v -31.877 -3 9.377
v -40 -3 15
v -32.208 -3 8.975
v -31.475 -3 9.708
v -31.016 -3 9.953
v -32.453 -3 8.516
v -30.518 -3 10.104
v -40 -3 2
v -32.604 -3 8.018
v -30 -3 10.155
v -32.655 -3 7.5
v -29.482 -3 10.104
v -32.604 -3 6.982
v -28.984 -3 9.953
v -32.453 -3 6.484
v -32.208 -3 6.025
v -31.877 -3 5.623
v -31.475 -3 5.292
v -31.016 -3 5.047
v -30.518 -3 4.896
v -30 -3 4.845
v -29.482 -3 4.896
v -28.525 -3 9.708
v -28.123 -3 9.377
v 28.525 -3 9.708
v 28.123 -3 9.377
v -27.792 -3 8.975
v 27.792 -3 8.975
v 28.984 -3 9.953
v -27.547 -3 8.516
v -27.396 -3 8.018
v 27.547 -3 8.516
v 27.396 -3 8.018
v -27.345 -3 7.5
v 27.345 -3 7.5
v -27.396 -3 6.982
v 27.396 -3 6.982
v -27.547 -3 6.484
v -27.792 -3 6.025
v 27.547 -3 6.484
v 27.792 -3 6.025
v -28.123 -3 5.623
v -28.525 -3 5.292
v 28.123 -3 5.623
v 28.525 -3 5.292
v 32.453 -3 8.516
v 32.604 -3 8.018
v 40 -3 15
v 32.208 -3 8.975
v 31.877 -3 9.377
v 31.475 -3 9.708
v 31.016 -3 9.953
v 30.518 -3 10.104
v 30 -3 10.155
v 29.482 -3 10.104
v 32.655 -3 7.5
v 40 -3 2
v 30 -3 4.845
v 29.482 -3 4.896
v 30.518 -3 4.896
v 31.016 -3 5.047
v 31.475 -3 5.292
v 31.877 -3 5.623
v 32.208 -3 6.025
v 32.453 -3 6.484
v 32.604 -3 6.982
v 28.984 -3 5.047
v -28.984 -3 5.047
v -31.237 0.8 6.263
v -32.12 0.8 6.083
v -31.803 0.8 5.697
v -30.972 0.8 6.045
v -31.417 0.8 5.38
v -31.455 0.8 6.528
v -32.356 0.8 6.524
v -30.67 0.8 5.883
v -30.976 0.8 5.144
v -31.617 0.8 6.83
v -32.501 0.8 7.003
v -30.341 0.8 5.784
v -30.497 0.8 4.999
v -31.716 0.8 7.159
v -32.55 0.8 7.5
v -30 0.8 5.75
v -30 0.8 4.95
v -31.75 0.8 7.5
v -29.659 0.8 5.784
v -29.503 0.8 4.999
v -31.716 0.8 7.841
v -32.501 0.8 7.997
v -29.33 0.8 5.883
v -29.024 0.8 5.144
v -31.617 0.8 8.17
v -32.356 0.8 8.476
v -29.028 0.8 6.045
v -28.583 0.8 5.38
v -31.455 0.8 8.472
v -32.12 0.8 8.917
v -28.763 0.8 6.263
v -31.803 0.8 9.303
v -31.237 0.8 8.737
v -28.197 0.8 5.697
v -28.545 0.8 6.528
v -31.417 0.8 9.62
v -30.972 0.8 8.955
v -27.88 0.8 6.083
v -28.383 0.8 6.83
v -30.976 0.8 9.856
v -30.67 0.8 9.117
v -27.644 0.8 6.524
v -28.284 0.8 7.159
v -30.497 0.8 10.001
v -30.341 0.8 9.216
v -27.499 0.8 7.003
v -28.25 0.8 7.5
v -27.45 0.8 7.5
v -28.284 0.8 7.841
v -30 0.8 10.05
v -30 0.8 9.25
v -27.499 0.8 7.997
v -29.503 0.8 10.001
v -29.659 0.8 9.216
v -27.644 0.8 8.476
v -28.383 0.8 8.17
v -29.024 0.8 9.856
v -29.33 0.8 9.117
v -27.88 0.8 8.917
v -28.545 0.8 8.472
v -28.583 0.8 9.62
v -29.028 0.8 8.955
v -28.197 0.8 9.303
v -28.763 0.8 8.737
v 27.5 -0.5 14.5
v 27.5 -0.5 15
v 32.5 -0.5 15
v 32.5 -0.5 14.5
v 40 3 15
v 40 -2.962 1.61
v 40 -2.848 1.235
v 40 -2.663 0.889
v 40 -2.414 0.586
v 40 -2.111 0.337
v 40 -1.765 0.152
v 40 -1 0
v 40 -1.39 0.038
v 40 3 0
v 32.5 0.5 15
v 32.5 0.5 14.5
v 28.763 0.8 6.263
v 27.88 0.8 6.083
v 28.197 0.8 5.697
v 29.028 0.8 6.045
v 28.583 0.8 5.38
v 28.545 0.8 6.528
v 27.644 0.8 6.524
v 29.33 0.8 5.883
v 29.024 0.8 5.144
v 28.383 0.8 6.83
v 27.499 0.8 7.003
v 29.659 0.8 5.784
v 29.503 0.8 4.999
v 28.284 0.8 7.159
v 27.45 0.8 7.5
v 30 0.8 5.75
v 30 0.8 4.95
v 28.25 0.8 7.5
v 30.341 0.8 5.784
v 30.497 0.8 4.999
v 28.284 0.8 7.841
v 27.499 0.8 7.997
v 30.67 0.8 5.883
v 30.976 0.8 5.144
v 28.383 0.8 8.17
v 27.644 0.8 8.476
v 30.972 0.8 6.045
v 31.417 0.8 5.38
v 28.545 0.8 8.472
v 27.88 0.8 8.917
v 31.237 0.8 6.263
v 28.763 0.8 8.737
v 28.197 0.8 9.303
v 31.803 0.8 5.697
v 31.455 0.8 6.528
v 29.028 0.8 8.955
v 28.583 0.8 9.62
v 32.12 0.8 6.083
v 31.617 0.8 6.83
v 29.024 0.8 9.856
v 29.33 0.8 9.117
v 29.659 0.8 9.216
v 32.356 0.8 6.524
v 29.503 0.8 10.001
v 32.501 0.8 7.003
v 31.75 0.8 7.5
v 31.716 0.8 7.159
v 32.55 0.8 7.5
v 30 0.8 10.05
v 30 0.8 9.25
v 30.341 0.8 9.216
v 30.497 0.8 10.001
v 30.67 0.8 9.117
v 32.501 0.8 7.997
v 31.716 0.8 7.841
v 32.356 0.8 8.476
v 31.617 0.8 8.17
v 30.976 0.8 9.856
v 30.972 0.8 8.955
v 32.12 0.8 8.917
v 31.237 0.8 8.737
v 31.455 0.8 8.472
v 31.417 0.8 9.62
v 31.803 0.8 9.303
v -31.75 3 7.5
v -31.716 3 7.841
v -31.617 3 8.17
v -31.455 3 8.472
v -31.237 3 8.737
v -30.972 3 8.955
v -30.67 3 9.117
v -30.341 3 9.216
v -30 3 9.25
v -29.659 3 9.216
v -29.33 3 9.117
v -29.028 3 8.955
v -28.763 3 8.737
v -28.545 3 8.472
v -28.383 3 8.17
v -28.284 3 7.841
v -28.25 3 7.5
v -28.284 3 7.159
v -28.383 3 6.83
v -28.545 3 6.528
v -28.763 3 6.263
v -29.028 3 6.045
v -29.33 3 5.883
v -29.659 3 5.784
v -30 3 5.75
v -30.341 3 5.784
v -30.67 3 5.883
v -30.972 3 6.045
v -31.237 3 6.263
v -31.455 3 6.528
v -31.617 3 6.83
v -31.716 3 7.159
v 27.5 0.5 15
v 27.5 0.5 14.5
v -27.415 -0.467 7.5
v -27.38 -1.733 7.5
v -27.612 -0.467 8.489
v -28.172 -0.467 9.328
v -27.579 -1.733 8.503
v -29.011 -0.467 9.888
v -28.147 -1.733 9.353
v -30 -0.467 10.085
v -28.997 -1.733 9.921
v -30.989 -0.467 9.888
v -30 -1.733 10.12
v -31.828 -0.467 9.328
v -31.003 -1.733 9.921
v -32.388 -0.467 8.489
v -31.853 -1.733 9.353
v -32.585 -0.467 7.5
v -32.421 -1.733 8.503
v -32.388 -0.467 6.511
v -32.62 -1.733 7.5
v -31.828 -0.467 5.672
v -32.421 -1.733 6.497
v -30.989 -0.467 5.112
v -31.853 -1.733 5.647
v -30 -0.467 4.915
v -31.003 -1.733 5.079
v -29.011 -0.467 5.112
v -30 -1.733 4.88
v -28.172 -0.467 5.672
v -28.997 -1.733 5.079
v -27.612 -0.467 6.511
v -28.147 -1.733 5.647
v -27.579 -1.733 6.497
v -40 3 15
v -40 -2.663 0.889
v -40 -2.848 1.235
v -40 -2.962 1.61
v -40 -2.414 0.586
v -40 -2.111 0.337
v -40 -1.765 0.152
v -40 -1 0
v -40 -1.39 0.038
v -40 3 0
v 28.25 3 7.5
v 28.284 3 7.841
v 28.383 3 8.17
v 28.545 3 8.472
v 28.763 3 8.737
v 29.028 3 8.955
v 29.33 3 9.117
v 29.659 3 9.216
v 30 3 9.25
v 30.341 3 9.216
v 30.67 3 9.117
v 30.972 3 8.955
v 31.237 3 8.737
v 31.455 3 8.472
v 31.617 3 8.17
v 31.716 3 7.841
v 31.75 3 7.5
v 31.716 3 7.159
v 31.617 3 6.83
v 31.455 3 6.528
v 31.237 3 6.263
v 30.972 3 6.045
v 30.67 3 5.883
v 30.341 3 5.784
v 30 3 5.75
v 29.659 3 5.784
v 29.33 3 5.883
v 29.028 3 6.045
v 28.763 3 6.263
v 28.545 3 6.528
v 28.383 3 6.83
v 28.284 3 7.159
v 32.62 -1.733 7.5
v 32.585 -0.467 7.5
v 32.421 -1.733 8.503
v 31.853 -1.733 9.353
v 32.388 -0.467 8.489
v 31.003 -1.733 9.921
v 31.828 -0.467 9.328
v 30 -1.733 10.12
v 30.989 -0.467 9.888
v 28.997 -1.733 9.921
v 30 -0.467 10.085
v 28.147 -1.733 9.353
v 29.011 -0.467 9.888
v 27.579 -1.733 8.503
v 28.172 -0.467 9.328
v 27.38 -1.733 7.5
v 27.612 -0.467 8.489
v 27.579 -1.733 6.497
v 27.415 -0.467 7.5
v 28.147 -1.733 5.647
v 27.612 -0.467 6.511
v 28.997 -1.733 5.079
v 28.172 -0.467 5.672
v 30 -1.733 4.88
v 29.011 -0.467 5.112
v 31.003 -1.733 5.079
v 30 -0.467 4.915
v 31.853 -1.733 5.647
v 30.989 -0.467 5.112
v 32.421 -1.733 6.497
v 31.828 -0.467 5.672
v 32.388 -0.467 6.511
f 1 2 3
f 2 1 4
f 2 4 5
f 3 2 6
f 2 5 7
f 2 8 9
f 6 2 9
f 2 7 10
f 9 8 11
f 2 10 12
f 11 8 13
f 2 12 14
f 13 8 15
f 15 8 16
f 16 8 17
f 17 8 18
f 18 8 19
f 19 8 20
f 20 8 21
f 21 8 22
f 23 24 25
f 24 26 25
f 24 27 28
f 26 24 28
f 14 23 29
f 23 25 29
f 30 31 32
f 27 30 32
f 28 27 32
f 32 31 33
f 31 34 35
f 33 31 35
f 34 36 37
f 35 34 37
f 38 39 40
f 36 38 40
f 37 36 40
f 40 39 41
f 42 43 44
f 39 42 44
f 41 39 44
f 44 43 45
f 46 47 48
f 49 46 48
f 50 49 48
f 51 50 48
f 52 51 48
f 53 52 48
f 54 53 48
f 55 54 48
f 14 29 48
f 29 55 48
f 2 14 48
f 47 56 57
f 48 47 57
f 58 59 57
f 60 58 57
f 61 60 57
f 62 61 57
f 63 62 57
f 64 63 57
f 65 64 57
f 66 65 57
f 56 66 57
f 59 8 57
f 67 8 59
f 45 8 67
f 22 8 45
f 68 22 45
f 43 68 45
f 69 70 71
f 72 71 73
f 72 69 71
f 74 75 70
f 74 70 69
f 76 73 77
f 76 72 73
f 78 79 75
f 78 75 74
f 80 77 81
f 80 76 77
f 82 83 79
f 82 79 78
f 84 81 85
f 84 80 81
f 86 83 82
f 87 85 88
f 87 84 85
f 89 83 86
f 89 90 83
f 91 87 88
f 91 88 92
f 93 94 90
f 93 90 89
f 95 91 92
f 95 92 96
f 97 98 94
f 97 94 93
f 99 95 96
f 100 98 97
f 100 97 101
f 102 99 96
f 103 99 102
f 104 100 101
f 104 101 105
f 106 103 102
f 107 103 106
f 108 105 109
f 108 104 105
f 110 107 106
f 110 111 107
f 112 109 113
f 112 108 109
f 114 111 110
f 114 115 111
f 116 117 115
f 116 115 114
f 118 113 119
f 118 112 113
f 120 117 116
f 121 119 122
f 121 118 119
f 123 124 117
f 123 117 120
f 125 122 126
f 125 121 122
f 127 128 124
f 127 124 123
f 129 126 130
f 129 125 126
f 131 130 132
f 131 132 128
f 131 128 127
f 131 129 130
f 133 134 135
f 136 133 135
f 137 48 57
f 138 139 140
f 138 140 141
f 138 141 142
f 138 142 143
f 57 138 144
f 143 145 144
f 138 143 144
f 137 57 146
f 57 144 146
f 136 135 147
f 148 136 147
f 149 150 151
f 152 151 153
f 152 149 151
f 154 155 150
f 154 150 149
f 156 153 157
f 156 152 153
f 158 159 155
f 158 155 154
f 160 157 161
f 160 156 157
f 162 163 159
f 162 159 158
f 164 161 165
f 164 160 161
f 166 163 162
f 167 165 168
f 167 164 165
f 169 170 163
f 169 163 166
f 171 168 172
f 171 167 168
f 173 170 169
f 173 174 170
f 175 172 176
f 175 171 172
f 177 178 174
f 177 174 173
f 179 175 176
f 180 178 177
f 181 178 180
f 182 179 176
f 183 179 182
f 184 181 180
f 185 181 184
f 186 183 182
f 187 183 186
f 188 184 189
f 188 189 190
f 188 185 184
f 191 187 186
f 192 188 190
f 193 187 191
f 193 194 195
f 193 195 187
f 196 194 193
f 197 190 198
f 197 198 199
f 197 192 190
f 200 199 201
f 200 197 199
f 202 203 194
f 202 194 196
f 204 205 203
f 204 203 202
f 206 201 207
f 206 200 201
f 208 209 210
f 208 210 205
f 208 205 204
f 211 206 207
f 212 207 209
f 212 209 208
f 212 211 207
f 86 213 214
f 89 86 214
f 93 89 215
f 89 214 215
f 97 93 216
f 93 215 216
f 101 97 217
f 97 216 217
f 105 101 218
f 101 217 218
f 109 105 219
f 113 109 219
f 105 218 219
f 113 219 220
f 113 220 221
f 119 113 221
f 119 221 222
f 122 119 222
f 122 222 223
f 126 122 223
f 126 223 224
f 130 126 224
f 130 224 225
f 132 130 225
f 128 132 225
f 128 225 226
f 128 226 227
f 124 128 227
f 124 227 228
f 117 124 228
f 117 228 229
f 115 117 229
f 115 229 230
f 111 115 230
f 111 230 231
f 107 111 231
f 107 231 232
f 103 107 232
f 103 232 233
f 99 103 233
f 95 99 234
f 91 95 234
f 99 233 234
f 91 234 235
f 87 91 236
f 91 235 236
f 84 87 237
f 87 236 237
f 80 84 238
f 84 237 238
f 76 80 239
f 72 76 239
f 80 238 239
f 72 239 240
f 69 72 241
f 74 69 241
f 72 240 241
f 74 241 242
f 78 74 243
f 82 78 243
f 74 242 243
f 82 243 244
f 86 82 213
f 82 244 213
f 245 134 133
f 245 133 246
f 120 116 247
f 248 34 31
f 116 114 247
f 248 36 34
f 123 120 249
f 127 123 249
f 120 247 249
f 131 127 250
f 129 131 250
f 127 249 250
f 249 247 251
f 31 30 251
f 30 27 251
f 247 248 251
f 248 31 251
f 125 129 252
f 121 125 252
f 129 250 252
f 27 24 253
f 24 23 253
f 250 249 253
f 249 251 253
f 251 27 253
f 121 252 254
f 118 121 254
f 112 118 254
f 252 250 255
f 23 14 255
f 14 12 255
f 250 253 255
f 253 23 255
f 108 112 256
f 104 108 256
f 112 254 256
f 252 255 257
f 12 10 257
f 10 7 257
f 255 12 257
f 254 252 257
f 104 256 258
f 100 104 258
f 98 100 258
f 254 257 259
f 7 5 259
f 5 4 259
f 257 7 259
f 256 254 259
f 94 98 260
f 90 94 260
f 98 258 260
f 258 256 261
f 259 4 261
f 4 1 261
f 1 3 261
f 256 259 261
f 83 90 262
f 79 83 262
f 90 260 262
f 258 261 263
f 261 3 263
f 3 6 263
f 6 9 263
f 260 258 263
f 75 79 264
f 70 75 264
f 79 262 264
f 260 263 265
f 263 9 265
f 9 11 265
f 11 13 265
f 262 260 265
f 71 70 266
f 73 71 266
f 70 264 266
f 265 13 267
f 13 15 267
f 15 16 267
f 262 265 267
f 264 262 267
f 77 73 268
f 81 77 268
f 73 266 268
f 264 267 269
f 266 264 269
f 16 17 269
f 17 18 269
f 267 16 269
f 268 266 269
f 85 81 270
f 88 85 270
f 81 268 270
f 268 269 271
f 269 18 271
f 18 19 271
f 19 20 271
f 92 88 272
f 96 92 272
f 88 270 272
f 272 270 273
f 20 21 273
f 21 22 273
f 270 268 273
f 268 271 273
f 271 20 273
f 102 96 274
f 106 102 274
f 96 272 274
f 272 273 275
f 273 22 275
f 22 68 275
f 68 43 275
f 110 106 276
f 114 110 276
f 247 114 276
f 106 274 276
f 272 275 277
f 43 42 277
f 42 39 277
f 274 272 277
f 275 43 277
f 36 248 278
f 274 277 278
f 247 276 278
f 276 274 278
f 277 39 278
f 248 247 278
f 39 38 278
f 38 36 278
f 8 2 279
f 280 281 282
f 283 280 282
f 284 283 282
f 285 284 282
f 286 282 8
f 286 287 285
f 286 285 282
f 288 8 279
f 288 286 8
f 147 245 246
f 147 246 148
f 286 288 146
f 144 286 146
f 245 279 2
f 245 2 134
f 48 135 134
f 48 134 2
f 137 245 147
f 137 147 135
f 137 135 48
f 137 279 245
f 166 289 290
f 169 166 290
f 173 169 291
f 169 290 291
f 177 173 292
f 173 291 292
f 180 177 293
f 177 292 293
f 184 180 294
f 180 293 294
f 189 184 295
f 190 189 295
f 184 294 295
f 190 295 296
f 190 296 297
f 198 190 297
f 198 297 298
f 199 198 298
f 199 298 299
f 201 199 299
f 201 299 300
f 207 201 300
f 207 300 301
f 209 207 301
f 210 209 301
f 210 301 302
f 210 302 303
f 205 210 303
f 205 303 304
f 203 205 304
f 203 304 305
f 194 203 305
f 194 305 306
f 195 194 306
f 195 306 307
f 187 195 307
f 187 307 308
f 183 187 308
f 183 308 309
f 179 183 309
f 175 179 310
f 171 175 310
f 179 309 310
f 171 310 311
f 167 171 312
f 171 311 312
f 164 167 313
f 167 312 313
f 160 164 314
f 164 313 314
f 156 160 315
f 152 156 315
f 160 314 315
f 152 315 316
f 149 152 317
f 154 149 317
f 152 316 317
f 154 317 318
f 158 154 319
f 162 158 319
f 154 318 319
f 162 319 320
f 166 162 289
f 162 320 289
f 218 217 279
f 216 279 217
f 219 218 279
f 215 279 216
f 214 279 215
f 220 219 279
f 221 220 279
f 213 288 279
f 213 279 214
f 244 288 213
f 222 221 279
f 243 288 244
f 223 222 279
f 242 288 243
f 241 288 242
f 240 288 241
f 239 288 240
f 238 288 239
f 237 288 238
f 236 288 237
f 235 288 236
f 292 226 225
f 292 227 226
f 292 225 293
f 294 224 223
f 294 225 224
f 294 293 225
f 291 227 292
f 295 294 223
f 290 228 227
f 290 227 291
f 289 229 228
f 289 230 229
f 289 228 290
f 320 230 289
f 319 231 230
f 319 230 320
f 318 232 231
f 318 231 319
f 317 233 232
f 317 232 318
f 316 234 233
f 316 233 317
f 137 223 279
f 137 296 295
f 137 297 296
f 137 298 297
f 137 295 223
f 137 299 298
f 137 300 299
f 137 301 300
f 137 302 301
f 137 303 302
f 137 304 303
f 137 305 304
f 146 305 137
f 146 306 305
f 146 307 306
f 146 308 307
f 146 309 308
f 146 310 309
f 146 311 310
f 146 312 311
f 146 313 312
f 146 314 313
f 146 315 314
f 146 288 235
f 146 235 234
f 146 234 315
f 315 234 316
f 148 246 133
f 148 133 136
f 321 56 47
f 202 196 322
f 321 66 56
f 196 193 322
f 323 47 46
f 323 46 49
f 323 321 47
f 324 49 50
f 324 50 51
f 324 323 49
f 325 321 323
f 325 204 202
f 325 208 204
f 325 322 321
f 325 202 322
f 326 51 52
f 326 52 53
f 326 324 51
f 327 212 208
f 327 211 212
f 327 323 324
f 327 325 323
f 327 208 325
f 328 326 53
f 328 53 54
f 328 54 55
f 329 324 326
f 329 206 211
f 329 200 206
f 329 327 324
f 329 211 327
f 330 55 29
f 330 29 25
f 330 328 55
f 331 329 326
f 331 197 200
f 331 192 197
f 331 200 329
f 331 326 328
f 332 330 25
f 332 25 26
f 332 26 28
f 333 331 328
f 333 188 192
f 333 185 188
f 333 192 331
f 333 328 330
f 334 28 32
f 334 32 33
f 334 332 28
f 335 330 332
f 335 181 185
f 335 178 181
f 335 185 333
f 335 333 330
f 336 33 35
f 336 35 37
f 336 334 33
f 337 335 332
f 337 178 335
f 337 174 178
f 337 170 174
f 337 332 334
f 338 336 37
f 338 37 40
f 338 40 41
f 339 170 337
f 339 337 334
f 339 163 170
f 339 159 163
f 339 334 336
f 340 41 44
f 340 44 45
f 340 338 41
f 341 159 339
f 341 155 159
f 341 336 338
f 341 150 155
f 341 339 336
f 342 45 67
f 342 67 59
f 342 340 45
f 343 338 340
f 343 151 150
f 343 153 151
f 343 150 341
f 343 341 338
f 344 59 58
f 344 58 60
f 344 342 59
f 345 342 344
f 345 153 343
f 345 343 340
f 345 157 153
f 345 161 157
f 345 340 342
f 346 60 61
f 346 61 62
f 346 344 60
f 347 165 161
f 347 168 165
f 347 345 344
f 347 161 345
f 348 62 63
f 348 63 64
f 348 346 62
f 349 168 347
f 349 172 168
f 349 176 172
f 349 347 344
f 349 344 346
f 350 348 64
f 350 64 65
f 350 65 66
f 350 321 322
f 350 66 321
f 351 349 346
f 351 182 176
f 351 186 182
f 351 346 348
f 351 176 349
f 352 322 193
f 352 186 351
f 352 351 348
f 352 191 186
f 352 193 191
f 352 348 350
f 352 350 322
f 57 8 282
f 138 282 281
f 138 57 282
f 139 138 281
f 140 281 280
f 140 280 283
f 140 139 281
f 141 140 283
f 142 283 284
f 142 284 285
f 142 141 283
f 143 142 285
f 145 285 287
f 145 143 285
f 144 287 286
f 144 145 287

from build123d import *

# Parameters (mm, degrees)
F0_W      = 80
F0_H      = 6
F1_DEPTH  = 15
F4_R      = 2.55
F2_R      = 2.655
F7_D      = 3.5
F8_R      = 2
F9_W      = 5
F9_H      = 1
F10_DEPTH = 0.5


with BuildPart() as f1:
    # F0 (on Top) → F1 (new body)
    with BuildSketch(Plane.XY):
        Rectangle(F0_W, F0_H)
    extrude(amount=F1_DEPTH)

    # F4 (on offset) → F5 section 0
    with BuildSketch(Plane.XZ.offset(-0.8)):
        with Locations((-30, 7.5)):
            Circle(F4_R)
    # F2 (on face) → F5 section 1
    with BuildSketch(Plane.XZ.offset(3)):
        with Locations((-30, 7.5)):
            Circle(F2_R)
    loft(mode=Mode.SUBTRACT)

    # F2 (on face) → F6 section 0
    with BuildSketch(Plane.XZ.offset(3)):
        with Locations((30, 7.5)):
            Circle(F2_R)
    # F4 (on offset) → F6 section 1
    with BuildSketch(Plane.XZ.offset(-0.8)):
        with Locations((30, 7.5)):
            Circle(F4_R)
    loft(mode=Mode.SUBTRACT)

    # F7 (through all)
    with Locations(Plane.XZ.offset(-0.8)):
        with Locations((30, 7.5), (-30, 7.5)):
            Hole(F7_D / 2)

    # F8
    f8_edges = [f1.edges().sort_by_distance(p)[0] for p in [
        (0, -3, 0),
    ]]
    fillet(f8_edges, radius=F8_R)

    # F9 (on face) → F10 (cut)
    with BuildSketch(Plane.XY.offset(15)):
        with Locations((30, 0)):
            Rectangle(F9_W, F9_H)
    extrude(amount=-F10_DEPTH, mode=Mode.SUBTRACT)


solid = f1.part
